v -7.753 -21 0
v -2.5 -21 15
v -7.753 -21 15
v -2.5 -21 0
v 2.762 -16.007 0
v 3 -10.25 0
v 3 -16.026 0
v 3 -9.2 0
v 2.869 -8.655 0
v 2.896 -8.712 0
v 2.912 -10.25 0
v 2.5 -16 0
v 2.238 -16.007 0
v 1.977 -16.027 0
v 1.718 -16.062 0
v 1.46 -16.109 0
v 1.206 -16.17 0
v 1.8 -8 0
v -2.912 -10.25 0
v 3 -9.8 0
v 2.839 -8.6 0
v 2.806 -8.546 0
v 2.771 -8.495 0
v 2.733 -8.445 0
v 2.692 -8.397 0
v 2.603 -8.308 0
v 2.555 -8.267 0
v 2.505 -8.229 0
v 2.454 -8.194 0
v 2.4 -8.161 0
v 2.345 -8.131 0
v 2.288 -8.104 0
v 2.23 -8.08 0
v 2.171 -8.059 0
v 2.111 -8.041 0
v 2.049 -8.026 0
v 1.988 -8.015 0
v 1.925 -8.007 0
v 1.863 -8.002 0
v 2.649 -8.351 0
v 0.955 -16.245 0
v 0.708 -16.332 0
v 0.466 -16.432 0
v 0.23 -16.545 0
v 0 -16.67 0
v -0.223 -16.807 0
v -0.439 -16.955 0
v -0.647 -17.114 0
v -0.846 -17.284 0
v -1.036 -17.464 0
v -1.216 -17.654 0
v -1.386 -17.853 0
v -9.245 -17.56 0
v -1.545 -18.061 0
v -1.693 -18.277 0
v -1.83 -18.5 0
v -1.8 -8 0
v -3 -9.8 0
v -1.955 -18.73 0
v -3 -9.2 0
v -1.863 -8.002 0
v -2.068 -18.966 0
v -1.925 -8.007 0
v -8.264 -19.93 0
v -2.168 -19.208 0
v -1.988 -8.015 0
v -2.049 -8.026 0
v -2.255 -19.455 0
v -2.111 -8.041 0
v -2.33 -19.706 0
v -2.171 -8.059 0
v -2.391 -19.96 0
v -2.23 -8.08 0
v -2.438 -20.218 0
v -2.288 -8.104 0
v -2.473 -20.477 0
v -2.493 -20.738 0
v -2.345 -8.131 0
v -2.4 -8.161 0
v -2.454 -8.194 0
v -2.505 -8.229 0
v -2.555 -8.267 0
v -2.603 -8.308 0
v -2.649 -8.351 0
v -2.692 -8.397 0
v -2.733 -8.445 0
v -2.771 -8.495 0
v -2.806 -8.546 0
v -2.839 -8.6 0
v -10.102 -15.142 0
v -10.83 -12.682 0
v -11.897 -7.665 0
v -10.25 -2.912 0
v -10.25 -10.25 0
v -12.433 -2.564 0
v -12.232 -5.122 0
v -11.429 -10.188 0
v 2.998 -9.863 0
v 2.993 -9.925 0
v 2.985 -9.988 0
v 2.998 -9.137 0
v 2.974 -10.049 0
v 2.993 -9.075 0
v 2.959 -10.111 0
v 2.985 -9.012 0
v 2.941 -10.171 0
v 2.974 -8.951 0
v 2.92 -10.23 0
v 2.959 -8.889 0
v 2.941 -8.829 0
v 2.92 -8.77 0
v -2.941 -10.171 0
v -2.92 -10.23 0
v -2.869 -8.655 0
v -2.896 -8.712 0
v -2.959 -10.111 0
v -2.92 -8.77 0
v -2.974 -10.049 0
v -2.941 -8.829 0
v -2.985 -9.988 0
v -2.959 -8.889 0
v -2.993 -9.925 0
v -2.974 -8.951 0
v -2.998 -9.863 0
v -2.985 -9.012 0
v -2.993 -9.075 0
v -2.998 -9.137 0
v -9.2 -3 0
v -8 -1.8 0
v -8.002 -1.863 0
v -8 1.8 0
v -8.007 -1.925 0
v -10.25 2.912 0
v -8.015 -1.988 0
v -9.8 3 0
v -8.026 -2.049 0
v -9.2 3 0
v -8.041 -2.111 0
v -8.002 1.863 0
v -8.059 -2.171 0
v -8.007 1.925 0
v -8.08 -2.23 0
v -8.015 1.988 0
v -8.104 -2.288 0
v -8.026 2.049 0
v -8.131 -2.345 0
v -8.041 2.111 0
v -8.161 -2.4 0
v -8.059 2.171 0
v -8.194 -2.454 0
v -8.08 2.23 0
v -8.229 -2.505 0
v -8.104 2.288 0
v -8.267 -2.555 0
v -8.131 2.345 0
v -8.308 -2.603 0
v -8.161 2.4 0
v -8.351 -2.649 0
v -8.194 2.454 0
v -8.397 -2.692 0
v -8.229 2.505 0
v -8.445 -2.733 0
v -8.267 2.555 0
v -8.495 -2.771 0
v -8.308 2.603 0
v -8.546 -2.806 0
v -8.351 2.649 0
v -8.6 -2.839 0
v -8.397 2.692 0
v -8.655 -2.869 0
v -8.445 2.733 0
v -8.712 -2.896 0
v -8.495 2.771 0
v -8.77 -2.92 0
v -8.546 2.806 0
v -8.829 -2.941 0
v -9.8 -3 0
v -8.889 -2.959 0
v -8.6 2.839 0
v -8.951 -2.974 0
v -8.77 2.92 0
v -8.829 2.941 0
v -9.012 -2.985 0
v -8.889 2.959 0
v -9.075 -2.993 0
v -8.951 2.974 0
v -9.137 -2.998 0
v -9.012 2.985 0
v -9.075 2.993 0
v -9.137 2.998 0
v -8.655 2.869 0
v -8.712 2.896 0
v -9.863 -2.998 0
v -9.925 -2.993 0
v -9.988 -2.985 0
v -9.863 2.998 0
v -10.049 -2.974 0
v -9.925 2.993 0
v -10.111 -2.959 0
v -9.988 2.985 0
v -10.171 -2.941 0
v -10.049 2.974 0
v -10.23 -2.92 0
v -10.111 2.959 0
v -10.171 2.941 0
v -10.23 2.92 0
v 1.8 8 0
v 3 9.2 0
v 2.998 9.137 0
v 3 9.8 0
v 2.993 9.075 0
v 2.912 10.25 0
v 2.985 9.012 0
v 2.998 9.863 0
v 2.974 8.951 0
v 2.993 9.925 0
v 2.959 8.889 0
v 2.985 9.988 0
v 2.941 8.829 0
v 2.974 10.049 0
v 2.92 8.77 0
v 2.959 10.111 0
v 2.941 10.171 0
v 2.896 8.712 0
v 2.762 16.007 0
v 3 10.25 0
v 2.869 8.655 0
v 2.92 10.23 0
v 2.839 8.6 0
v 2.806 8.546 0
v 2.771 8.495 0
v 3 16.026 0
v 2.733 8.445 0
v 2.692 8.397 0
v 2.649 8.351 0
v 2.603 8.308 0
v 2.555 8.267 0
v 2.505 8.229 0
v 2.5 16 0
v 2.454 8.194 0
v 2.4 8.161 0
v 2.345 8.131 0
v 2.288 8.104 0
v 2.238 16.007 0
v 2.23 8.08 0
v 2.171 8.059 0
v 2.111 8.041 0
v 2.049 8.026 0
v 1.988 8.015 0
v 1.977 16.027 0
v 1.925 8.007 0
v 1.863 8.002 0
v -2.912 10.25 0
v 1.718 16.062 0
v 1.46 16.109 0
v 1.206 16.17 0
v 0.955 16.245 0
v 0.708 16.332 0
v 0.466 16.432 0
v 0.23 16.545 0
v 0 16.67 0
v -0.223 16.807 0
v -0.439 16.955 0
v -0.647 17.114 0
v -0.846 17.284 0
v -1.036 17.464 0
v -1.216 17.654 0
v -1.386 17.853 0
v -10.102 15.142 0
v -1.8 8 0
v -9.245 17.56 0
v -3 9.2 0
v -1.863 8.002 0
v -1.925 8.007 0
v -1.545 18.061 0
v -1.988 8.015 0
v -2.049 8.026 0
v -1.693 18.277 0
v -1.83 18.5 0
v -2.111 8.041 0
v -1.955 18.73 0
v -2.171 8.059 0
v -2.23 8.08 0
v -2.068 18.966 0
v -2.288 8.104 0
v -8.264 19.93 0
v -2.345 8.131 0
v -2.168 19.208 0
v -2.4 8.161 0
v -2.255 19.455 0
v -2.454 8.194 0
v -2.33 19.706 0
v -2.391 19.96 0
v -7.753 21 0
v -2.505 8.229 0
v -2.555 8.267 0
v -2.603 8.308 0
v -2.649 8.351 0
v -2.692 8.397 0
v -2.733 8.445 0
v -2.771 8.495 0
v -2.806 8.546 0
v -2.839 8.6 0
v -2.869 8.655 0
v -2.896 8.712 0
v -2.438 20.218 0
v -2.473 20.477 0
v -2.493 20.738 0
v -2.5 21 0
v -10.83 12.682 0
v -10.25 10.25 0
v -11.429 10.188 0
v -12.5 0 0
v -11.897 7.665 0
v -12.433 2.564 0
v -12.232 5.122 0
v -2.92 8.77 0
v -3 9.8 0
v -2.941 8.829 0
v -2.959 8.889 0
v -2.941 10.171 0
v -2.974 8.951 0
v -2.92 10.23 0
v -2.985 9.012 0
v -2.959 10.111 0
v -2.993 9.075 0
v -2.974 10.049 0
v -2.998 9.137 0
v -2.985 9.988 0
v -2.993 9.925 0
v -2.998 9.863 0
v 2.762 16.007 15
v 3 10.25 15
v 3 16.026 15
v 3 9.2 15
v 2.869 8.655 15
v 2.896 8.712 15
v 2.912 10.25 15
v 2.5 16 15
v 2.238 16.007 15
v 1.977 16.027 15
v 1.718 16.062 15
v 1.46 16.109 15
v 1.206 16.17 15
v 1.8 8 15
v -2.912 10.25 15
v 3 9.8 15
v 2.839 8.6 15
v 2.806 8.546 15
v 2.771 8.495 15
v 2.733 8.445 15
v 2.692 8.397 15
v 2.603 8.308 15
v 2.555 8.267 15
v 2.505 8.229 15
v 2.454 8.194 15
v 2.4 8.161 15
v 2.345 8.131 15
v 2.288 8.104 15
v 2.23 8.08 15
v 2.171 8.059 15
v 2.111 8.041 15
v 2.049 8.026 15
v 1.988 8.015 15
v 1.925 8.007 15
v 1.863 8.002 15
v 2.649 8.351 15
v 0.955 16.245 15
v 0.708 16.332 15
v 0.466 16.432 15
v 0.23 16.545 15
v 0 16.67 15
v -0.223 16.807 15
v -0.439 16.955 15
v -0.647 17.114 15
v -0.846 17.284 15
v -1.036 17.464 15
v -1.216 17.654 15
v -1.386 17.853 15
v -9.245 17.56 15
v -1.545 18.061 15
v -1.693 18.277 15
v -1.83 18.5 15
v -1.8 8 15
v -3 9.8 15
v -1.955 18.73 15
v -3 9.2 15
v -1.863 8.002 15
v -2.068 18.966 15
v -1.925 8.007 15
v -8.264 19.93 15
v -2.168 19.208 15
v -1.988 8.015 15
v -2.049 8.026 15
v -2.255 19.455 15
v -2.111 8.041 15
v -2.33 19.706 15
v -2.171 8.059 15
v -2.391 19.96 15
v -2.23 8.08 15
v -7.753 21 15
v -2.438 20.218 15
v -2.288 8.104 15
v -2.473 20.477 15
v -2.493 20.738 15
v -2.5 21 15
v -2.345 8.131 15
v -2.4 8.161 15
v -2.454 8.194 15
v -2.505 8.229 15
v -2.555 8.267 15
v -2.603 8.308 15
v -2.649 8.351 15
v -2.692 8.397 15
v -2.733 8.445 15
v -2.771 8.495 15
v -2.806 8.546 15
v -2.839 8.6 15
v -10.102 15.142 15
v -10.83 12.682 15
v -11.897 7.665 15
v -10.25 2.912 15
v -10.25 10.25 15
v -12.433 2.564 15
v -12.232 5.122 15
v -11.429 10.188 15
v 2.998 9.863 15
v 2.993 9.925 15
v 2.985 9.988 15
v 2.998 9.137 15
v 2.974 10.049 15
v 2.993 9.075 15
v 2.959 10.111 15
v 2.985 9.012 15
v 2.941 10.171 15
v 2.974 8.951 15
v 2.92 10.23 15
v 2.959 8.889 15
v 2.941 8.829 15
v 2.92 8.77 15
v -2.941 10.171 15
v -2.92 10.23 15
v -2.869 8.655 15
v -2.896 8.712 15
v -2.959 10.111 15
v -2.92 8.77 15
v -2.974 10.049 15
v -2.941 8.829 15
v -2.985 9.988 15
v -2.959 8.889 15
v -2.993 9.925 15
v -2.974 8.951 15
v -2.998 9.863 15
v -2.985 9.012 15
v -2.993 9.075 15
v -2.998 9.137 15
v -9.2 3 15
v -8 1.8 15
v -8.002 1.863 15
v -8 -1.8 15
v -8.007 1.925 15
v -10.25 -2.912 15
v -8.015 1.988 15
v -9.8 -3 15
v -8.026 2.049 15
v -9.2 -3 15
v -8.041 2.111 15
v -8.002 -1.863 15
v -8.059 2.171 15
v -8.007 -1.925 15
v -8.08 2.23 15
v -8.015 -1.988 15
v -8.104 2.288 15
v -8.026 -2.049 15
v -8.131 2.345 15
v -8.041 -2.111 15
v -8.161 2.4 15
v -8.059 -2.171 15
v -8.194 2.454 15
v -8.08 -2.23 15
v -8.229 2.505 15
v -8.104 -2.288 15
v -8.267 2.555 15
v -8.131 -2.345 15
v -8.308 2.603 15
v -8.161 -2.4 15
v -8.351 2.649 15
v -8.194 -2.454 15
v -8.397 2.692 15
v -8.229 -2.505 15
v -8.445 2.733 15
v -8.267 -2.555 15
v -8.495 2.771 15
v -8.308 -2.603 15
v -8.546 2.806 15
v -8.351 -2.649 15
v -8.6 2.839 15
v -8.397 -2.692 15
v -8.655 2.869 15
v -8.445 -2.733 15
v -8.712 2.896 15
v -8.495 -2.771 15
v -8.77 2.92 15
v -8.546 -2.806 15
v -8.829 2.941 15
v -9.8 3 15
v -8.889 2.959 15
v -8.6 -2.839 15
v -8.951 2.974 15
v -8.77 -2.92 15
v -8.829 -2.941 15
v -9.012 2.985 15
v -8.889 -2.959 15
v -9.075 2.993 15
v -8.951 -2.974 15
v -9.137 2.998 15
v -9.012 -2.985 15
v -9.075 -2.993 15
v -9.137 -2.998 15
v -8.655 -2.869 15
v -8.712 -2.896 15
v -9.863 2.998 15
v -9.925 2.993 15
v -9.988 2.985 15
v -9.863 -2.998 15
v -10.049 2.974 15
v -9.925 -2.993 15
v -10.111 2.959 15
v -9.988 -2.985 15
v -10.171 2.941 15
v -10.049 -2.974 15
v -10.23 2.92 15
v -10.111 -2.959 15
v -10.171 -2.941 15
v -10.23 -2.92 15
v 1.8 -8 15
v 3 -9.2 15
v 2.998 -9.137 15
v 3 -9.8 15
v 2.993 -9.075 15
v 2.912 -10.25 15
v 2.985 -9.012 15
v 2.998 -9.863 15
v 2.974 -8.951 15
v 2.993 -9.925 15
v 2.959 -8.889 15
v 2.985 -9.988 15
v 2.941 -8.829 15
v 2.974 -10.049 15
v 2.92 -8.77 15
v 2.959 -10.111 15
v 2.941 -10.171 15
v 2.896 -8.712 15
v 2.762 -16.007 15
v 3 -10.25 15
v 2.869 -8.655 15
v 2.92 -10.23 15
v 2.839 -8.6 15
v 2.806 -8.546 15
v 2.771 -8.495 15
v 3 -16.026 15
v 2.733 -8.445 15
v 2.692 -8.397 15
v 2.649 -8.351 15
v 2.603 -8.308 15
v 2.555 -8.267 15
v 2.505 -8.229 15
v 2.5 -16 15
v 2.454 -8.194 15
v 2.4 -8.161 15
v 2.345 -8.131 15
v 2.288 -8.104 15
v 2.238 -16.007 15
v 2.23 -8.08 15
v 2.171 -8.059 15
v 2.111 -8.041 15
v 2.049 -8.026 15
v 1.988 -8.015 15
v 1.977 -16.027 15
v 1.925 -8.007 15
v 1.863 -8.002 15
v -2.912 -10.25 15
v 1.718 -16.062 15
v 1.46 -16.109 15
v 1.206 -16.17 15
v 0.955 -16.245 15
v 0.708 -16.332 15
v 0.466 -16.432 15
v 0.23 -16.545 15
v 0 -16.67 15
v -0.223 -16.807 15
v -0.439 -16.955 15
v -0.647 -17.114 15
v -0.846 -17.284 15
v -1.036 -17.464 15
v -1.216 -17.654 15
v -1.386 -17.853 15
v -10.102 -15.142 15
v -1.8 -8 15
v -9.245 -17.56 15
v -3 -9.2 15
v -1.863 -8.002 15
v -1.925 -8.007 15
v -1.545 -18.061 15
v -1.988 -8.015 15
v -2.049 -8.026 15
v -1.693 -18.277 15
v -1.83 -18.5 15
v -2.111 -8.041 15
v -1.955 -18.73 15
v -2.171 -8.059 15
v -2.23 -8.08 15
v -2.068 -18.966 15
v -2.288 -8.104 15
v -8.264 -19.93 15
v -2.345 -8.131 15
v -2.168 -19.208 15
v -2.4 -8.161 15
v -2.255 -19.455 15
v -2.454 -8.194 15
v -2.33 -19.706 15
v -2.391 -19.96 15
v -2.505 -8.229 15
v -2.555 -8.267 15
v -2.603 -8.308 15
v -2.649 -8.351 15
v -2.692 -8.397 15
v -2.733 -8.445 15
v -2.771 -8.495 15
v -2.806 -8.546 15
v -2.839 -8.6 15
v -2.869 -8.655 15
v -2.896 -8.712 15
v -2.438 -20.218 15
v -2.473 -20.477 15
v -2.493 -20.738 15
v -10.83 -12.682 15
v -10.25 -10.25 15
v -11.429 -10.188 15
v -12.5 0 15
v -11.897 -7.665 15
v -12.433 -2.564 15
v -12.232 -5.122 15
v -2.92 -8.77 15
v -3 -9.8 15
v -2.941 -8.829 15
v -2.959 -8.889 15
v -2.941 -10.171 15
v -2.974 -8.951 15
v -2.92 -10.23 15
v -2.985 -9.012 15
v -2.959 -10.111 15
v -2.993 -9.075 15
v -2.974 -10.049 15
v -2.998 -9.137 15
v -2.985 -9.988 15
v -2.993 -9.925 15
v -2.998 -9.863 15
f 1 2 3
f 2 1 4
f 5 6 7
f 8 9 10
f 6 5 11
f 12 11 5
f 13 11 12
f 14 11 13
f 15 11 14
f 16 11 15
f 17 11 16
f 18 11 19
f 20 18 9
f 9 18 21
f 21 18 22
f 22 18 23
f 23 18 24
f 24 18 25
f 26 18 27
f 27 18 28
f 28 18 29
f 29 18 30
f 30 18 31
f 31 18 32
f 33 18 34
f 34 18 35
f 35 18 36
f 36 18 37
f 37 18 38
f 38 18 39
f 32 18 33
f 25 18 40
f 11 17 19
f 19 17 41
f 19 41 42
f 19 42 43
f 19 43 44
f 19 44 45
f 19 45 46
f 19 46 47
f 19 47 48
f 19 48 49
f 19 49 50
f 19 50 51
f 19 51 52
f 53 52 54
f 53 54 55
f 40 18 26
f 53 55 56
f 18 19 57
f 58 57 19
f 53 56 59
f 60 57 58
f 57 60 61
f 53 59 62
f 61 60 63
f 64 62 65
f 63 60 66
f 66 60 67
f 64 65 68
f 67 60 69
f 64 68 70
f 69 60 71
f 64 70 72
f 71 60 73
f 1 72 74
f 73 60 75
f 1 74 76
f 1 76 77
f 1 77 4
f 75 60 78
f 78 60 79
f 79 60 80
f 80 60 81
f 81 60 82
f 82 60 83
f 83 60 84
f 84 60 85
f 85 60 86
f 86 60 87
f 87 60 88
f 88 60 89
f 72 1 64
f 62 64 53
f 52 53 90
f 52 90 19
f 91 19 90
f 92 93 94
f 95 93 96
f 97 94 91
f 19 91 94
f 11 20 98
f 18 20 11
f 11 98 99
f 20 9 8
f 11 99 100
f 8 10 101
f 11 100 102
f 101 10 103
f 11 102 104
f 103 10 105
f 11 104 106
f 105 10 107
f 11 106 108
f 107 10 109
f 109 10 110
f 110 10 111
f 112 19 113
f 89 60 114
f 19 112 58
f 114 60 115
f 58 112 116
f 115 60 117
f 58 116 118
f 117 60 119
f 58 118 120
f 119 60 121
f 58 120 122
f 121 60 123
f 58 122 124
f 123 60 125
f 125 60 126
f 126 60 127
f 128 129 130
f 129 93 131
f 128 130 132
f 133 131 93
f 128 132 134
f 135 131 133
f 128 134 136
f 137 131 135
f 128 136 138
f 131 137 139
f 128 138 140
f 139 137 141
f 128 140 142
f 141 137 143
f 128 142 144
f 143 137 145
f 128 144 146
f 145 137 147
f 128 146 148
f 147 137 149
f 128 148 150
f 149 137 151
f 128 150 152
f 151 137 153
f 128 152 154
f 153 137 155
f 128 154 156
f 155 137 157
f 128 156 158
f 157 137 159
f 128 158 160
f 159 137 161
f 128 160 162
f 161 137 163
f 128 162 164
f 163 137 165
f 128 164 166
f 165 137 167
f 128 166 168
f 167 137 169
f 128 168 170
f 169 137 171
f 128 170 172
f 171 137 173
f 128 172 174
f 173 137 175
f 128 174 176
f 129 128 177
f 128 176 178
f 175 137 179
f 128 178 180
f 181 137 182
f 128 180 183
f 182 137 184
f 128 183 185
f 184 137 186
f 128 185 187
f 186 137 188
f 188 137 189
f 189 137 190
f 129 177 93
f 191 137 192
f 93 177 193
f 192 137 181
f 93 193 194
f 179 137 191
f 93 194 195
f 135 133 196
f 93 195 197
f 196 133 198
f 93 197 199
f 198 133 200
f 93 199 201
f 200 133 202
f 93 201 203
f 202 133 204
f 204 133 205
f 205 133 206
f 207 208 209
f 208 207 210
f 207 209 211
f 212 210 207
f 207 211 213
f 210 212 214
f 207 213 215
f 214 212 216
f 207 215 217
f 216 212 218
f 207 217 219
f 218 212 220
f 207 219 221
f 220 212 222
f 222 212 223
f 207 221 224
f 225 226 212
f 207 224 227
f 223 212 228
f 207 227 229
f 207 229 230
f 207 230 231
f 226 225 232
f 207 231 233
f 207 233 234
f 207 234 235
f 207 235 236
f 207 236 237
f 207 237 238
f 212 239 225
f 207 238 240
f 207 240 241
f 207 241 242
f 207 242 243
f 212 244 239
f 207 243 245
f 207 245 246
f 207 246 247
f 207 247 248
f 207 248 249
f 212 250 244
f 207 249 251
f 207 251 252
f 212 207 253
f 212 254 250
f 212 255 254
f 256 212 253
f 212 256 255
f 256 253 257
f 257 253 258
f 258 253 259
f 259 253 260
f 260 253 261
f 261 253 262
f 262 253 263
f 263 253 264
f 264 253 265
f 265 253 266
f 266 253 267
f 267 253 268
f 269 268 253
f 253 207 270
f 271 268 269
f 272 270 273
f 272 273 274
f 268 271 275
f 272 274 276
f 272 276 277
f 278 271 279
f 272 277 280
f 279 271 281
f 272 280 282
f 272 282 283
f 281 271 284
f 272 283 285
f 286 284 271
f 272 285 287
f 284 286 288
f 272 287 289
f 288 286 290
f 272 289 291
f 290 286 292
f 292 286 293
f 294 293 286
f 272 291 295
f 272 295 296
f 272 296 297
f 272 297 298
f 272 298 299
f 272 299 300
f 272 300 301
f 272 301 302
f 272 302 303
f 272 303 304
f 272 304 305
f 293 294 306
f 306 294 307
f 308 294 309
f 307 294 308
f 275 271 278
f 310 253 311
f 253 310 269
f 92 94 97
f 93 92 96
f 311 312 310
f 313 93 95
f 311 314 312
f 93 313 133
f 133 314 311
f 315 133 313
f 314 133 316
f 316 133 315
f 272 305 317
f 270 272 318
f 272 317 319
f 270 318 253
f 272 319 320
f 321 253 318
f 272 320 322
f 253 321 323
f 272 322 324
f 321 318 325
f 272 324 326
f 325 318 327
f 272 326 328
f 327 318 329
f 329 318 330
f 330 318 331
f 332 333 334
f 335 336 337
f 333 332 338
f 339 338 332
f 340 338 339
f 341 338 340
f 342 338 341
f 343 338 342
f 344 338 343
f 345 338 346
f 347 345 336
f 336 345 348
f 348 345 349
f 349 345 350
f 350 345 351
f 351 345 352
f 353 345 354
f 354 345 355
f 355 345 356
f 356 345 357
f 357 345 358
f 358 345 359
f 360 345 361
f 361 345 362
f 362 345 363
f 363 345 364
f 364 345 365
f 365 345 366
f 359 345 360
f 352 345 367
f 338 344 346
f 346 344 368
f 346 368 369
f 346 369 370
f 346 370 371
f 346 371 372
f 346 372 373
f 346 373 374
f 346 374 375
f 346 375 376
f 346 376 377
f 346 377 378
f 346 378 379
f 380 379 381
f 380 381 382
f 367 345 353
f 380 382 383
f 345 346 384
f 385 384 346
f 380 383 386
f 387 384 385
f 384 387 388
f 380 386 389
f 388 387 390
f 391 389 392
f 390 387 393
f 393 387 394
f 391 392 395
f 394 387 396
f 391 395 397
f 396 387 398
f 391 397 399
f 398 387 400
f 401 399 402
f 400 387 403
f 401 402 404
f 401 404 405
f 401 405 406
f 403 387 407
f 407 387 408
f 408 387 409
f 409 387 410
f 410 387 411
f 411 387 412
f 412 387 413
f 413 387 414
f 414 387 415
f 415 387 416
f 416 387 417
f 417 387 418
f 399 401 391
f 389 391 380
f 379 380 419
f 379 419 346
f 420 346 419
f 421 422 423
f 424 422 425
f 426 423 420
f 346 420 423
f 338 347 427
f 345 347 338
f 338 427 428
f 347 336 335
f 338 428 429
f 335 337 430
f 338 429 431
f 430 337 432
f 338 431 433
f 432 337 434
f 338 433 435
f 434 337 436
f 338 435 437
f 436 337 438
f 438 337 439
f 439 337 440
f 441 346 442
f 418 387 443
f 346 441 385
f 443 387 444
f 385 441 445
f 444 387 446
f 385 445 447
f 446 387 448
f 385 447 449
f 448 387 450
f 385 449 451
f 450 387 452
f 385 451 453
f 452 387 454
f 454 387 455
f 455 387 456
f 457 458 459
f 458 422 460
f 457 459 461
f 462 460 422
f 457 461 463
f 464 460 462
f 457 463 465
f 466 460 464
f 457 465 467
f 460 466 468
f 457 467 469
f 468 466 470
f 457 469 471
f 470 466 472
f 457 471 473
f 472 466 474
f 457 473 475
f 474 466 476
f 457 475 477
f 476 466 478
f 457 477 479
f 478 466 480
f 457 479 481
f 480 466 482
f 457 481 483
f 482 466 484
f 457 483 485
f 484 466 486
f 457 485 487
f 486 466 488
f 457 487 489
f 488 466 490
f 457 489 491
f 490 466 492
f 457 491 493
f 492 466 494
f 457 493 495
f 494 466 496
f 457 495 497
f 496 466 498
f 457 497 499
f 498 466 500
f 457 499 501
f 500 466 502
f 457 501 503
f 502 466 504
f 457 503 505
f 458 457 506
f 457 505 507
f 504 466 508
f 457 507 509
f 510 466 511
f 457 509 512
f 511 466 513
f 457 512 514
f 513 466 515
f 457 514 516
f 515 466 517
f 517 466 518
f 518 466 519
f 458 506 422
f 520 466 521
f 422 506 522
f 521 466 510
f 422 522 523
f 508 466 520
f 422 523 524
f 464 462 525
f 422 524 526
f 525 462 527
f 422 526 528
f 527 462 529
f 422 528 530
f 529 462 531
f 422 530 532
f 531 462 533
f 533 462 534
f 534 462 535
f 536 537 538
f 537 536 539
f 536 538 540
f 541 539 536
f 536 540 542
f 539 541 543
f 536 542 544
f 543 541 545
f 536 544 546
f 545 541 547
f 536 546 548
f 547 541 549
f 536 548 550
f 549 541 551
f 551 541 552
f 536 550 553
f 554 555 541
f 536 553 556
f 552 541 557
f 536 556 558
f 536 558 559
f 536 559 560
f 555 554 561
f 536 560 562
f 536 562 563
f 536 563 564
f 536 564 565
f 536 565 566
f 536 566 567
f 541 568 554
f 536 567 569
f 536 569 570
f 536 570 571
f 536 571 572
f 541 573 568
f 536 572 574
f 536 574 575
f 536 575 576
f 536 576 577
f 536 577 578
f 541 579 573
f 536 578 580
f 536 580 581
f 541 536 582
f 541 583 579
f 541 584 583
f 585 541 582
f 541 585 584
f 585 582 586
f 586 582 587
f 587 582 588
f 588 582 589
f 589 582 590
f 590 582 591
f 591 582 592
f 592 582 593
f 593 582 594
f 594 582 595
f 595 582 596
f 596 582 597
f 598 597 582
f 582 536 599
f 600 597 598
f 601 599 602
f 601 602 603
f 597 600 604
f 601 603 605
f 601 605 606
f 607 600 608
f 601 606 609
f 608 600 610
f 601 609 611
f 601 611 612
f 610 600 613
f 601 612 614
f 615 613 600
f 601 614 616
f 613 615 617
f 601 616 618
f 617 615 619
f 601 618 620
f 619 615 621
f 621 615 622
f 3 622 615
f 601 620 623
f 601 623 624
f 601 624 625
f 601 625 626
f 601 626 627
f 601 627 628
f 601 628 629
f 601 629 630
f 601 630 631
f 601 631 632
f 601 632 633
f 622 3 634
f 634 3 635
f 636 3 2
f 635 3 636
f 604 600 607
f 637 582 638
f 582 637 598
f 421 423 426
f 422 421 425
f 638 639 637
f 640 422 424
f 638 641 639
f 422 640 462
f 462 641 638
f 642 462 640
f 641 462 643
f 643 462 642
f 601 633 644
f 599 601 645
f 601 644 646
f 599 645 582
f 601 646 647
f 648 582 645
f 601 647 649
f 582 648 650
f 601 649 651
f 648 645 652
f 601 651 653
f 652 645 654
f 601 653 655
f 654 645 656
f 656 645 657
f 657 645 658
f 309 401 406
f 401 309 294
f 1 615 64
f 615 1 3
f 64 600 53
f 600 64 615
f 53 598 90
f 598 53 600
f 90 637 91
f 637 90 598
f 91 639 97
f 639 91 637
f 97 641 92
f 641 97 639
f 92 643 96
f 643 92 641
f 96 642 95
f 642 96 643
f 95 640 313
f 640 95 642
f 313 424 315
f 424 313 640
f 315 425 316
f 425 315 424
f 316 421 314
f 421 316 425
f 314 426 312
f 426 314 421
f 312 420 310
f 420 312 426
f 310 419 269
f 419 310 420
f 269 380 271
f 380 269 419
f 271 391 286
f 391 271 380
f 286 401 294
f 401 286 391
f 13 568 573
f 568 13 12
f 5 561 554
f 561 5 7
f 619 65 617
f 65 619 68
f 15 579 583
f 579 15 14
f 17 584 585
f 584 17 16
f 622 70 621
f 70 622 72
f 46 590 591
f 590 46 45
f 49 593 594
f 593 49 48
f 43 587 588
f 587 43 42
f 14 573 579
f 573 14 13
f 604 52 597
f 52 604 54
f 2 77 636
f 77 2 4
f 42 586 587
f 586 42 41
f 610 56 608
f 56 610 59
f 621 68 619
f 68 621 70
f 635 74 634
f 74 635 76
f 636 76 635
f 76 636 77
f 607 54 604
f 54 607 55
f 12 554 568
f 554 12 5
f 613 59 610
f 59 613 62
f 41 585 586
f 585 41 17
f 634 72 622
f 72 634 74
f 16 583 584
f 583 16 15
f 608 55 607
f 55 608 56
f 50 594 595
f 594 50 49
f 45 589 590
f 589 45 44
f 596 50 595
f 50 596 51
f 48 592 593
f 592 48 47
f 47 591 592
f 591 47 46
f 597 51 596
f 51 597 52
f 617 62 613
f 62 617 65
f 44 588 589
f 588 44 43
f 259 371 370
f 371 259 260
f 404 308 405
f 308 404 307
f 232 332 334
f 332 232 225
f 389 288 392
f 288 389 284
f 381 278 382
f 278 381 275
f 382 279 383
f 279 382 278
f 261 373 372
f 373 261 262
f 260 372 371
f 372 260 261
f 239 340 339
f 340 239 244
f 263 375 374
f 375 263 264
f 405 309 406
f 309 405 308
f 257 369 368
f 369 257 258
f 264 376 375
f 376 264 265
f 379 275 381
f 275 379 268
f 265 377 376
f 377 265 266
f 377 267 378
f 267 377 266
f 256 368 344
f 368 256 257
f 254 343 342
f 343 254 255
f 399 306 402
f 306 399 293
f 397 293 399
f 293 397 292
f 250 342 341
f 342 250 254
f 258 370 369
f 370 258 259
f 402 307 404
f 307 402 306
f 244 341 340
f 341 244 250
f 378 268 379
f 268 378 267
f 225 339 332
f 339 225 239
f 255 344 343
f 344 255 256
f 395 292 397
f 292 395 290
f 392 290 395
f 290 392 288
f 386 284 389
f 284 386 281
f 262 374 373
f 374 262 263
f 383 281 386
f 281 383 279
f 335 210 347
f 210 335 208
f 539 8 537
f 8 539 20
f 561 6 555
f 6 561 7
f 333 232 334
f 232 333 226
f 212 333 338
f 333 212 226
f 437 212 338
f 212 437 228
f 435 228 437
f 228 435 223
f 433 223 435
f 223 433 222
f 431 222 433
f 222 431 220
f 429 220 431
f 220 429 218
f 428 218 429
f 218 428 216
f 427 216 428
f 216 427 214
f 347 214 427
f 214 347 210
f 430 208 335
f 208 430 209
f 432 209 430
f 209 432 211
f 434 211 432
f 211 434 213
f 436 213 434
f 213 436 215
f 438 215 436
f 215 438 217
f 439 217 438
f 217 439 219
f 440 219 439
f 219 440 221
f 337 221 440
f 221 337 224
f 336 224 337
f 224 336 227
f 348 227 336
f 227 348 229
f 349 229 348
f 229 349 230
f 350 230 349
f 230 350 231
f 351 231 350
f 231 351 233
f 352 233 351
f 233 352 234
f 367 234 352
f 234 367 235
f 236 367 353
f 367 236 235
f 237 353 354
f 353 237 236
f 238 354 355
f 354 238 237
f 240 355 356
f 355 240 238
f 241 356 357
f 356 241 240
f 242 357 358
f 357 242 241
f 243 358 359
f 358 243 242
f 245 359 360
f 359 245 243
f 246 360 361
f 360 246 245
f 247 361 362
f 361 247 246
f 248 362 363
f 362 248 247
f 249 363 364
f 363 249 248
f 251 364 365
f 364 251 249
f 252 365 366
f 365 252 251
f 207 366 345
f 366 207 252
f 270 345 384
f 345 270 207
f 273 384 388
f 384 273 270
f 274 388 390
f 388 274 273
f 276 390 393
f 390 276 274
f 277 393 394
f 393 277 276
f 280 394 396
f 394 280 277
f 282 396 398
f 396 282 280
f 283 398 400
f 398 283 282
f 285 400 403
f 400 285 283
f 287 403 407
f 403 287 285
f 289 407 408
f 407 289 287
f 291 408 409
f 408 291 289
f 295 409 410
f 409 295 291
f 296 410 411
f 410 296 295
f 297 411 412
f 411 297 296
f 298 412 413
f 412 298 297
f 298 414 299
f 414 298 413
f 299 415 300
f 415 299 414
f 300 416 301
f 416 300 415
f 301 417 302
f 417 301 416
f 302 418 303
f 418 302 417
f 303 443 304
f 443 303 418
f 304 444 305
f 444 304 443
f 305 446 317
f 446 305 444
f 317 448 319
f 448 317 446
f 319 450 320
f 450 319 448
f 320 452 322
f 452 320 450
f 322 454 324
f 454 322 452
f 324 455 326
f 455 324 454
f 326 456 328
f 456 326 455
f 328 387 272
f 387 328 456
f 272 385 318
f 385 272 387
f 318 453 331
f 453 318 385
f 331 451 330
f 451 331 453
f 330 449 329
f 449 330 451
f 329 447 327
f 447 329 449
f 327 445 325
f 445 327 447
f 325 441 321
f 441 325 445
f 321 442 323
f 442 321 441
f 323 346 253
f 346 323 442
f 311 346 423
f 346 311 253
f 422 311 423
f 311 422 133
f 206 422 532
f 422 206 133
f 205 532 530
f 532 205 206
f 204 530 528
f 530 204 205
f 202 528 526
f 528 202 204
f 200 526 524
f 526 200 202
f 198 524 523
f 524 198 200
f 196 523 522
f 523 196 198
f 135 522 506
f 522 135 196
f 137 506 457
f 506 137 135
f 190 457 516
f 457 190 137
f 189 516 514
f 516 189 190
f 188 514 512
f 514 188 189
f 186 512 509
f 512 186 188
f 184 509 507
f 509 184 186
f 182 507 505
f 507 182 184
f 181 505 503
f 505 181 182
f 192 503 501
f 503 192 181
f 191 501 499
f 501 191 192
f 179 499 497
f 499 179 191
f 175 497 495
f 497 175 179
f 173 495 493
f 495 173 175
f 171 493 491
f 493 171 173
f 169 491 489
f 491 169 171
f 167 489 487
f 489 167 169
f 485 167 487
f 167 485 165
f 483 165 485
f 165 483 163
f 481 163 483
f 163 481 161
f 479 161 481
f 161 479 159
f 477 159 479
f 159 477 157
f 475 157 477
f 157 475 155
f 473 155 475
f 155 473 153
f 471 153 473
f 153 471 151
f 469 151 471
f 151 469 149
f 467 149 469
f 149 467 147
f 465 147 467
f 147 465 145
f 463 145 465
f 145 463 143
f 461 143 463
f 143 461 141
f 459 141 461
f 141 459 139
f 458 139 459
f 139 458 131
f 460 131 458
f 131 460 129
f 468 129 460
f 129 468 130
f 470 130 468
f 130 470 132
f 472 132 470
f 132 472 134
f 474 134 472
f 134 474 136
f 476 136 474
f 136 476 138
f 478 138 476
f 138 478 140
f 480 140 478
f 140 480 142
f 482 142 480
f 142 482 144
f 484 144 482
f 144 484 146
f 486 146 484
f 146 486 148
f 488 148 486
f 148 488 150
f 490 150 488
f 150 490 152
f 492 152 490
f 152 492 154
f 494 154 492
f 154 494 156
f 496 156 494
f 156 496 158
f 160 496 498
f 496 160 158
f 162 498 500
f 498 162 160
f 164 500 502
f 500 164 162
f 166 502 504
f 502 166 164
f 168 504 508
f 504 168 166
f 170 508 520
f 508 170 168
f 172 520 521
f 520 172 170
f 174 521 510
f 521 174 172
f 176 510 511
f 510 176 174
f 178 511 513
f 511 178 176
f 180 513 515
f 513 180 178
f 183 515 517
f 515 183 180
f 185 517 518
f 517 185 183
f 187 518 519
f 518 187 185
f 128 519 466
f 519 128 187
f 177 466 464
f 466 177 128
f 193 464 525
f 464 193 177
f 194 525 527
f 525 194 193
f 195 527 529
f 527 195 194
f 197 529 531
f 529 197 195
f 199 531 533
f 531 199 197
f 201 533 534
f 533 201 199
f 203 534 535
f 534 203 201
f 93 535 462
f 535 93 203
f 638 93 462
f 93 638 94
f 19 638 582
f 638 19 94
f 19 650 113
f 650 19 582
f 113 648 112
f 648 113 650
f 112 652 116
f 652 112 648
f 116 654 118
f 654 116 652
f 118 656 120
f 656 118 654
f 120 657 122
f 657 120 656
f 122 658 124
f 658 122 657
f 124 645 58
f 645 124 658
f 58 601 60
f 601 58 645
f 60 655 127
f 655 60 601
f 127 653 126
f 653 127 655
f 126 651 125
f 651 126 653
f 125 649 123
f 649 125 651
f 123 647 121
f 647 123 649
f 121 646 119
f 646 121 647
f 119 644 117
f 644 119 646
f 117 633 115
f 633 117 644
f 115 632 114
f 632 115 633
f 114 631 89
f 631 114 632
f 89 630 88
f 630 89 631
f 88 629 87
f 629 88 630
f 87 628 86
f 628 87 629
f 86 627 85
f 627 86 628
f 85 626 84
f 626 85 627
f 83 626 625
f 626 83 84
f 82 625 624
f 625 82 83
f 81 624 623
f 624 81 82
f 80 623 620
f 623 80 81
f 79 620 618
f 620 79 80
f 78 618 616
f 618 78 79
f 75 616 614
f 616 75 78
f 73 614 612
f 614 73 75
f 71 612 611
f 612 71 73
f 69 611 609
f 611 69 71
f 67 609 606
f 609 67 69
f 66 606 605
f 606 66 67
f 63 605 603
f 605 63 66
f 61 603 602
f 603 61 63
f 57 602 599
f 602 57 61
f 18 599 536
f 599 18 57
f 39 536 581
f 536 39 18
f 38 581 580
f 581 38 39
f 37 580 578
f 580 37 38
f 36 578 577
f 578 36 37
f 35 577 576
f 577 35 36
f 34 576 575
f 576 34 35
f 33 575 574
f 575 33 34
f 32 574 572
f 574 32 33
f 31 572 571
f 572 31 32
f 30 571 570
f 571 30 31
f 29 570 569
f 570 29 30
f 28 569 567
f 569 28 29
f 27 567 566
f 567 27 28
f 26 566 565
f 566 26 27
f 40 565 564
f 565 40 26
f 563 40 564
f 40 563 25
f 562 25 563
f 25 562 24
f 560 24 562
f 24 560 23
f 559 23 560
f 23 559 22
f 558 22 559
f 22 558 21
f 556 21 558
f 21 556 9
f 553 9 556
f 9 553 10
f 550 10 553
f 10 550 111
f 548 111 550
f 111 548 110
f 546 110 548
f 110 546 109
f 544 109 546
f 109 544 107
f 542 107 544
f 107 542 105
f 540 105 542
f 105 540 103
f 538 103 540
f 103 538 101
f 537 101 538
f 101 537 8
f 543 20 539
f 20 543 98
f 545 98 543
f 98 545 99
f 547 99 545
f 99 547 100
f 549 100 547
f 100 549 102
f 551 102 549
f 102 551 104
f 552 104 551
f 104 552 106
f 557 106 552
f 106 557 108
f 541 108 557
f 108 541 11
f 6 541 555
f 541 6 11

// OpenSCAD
// Reference geometry for boolean design
// Units: mm

$fn = 120;

// --------------------
// Parameters
// --------------------

extrusion_size = 20.5;
slot_width = 6;
slot_depth = 1.5;
center_bore_d = 5;

cover_radius = 50;
cover_thickness = 1;
cover_height = 60;       // vertical extent of reference section

mount_tab_spacing = 42;

part_depth = 15;          // extrusion depth for preview/reference bodies


rods = true;
rod_dia = 10;
rod_spacing = mount_tab_spacing;
rod_offset_x = 2.5;

// --------------------
// Preview layout
// --------------------

reference_scene();


// --------------------
// Scene
// --------------------

module reference_scene() {
  difference() {
    linear_extrude(part_depth)
    translate([-5, 0, 0])
    rounded_rect(16, 45, 1, true);

    #extrusion_20x20();

    #translate([36.5, 0, 0])
    rounded_cover_2d();

    #translate([rod_offset_x, 0, 0])
    rods();
  }
}

module rods() {
  for(i = [-1, 1]) {
    translate([0, i * rod_spacing/2])
    cylinder(d = rod_dia, h = part_depth);
  }
}

// --------------------
// 20x20 extrusion
// centered at origin
// --------------------

module extrusion_20x20() {
  linear_extrude(part_depth)
  difference() {
    square([extrusion_size, extrusion_size], center = true);

    // Four 6 mm slots
    translate([0, extrusion_size/2 - slot_depth/2])
    slot_cutout(slot_width, slot_depth);

    rotate(90)
    translate([0, extrusion_size/2 - slot_depth/2])
    slot_cutout(slot_width, slot_depth);

    rotate(180)
    translate([0, extrusion_size/2 - slot_depth/2])
    slot_cutout(slot_width, slot_depth);

    rotate(270)
    translate([0, extrusion_size/2 - slot_depth/2])
    slot_cutout(slot_width, slot_depth);
  }
}

module slot_cutout(w, d) {
    rounded_rect(w, d * 2, 1.2, center = true);
}


// --------------------
// Rounded cover shell
// 1 mm thick, radius 70
// open on the right side
// --------------------

module rounded_cover_2d() {
  linear_extrude(part_depth)
    intersection() {
    difference() {
        circle(r = cover_radius + 20);
        circle(r = cover_radius - cover_thickness);
    }

    // Keep only left-side arc section
    polygon([
        [0, -cover_height],
        [-cover_radius - 20, -cover_height],
        [-cover_radius - 20, cover_height],
        [0, cover_height]
    ]);
  }

  // mount tab center markers, 42 mm apart
  for (y = [-mount_tab_spacing/2 - 5, mount_tab_spacing/2 + 5])
    hull() {
      translate([-60, y, 0])
      cylinder(h = part_depth, d = 10);
      translate([0, y, 0])
      cylinder(h = part_depth, d = 10);
    }
}


// --------------------
// Helpers
// --------------------

module rounded_rect(w, h, r, center = false) {
  translate(center ? [-w/2, -h/2] : [0, 0])
  hull() {
    translate([r, r]) circle(r = r);
    translate([w-r, r]) circle(r = r);
    translate([r, h-r]) circle(r = r);
    translate([w-r, h-r]) circle(r = r);
  }
}
